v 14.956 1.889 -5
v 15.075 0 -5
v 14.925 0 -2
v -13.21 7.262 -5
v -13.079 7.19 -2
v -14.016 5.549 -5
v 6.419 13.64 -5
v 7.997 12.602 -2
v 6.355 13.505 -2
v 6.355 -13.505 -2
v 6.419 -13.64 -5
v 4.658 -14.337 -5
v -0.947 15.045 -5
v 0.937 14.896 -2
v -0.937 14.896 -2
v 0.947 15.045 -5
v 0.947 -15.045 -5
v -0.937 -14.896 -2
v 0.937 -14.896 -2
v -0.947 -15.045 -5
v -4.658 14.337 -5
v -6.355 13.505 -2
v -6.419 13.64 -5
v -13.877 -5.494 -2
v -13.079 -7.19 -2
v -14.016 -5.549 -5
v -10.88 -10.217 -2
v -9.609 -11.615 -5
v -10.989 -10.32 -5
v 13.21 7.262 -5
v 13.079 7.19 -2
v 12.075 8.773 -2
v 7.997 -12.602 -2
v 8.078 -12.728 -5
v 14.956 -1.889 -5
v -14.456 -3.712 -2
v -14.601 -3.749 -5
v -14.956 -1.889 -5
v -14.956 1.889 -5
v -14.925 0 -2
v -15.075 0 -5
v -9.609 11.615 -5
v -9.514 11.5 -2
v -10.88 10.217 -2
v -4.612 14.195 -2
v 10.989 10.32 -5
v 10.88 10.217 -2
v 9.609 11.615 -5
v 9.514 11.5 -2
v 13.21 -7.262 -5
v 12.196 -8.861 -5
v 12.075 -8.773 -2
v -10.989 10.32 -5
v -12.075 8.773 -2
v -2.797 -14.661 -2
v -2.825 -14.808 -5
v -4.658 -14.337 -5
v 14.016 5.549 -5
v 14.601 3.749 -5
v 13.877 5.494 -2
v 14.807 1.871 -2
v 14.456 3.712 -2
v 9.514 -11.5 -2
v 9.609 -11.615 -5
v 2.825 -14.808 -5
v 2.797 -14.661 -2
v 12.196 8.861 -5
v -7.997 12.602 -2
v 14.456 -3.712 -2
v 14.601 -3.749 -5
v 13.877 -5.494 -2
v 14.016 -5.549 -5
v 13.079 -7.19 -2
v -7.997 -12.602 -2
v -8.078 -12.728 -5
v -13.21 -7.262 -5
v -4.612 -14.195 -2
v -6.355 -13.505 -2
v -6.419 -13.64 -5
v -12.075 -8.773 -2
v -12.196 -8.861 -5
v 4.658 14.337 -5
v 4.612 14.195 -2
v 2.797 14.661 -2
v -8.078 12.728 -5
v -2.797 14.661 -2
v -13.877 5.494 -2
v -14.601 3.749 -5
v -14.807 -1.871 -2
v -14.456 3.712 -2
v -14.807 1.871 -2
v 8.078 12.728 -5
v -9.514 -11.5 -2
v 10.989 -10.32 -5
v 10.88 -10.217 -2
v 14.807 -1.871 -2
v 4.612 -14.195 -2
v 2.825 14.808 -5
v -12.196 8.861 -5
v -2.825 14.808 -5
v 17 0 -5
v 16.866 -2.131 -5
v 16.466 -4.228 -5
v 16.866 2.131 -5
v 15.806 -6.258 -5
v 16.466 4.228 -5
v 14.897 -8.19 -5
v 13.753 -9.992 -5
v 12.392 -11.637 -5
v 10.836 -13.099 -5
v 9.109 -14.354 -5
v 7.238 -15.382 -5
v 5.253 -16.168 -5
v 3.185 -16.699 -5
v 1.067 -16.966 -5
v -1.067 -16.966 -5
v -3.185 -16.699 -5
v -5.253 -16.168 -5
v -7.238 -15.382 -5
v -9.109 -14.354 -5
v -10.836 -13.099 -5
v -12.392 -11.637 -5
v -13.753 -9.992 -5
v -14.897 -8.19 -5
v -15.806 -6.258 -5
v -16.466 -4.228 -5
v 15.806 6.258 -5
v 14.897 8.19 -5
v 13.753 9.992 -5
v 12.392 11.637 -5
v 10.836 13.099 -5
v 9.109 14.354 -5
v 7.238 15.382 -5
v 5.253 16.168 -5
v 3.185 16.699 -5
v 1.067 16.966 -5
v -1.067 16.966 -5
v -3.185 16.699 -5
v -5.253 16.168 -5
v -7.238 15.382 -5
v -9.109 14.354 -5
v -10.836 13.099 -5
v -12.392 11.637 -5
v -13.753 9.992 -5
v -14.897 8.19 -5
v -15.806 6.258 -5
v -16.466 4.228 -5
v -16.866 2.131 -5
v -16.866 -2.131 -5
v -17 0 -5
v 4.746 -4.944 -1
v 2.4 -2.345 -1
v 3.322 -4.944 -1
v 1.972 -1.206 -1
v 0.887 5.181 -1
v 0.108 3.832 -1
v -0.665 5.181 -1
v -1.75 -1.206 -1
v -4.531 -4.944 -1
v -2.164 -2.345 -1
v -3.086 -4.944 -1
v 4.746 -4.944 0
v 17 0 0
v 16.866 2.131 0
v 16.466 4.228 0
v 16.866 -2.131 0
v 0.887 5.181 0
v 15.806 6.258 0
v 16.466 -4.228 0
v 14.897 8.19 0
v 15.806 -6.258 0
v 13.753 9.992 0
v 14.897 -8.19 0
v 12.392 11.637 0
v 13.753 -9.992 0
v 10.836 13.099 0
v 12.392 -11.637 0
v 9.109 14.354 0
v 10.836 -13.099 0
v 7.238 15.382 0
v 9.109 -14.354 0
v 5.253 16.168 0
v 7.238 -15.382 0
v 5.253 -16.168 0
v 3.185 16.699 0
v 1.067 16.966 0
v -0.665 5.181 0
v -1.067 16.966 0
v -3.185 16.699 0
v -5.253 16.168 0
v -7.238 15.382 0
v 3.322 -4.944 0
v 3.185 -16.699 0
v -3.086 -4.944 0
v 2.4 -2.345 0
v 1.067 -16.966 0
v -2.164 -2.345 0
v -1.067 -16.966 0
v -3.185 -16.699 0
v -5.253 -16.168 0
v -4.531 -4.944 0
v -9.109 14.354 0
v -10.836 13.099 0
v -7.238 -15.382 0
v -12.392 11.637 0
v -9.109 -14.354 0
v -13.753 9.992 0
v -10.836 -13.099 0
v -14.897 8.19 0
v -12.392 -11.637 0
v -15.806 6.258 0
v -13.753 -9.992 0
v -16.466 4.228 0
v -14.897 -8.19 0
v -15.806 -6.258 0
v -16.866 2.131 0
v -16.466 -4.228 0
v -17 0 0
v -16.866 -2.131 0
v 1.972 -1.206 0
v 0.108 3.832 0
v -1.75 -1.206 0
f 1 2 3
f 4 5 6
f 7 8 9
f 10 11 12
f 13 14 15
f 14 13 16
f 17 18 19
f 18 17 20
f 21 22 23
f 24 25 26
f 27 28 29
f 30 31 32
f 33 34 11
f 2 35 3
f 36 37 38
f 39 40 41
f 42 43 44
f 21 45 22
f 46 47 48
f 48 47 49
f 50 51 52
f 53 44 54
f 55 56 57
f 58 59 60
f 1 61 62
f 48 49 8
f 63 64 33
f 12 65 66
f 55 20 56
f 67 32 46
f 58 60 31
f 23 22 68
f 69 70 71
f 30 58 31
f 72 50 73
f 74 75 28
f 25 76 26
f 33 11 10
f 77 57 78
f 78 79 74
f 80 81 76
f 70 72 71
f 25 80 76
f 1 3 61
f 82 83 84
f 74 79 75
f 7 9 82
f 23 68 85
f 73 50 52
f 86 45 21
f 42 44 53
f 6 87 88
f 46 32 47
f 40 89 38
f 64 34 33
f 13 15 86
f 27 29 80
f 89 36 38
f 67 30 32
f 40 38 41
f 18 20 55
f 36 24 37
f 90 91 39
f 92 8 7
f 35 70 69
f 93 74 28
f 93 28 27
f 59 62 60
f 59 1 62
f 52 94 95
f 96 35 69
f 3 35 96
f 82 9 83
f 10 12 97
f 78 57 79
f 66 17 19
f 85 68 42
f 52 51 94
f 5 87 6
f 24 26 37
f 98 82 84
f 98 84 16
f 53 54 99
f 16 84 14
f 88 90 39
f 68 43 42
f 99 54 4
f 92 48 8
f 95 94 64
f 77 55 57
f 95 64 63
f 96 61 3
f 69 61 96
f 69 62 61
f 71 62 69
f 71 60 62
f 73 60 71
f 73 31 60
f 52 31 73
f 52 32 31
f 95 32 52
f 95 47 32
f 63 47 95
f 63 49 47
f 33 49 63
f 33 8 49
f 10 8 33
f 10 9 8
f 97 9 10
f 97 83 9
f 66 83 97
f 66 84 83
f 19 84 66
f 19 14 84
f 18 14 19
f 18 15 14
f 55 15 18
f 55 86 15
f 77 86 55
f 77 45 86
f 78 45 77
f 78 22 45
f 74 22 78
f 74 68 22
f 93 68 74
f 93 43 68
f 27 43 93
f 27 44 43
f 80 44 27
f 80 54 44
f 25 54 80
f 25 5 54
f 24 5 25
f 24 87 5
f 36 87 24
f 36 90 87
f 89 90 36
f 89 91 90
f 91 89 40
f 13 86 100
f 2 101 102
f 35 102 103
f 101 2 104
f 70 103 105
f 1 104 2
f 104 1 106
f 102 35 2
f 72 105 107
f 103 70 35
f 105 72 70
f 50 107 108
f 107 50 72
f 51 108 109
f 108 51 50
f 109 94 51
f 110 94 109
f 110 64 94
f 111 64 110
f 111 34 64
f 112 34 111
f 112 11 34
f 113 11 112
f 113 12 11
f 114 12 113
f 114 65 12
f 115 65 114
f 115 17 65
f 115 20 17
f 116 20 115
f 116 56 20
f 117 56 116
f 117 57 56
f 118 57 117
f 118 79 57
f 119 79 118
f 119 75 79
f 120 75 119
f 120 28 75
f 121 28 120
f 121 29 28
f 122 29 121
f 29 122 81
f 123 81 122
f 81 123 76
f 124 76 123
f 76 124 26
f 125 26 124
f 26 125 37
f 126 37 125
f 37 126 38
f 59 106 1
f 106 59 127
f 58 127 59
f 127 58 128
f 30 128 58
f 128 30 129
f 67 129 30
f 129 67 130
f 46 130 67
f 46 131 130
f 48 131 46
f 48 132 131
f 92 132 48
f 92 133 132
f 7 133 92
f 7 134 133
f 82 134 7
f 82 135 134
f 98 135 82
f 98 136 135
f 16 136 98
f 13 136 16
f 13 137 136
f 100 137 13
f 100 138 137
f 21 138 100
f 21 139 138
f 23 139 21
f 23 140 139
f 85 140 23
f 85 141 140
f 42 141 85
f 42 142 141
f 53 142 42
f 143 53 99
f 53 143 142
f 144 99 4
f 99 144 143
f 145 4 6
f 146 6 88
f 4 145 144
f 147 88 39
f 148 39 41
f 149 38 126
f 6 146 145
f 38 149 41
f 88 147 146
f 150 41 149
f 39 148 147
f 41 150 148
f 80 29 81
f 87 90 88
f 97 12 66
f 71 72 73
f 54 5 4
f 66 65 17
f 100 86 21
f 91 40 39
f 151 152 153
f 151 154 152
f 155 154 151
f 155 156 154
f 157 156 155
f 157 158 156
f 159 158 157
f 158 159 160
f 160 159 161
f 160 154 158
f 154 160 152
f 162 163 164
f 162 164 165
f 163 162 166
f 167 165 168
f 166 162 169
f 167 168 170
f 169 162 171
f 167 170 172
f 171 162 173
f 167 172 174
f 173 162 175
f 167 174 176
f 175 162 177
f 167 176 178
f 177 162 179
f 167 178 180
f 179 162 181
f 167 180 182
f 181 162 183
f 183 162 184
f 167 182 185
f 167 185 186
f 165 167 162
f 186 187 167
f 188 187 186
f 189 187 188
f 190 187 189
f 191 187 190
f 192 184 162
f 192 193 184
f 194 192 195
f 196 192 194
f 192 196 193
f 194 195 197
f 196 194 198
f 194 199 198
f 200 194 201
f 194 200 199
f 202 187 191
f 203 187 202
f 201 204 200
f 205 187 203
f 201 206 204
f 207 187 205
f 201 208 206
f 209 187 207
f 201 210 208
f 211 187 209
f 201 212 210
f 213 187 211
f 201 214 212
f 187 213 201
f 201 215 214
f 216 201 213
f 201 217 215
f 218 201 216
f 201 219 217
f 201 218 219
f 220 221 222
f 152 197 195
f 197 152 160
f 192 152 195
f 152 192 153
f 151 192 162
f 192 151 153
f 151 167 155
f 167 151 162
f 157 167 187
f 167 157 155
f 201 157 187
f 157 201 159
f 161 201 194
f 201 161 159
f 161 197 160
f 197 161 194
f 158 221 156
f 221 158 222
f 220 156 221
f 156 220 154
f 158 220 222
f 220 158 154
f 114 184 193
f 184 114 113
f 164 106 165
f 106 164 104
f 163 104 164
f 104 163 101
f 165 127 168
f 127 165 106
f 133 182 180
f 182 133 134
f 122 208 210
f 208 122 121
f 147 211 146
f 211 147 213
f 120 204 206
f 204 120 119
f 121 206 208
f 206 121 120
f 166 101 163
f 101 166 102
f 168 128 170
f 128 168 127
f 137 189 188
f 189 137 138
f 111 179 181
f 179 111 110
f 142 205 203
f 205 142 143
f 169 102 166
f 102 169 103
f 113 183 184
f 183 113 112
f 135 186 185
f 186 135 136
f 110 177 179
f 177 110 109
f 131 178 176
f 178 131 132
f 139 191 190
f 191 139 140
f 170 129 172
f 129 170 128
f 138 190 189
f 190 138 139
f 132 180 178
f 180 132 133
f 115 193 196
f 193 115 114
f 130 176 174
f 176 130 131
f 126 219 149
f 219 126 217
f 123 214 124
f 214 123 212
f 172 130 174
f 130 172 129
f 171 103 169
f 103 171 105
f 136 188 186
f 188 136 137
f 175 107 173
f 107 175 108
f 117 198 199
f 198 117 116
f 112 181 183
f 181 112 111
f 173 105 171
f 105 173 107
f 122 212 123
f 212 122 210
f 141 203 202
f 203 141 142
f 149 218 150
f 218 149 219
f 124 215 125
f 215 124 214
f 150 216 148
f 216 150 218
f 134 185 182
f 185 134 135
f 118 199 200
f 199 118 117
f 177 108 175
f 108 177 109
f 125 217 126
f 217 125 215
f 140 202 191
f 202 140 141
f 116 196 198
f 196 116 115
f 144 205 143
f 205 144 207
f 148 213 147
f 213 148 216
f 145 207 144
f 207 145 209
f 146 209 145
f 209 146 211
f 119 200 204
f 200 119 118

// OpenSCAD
$fn = 50;

difference() {
	union() {
		translate(v = [0, 0, -5.0]) {
			cylinder(h = 5, r = 17.0);
		}
	}
	union() {
		#translate(v = [0, 0, -5.0]) {
			cylinder(h = 3, r1 = 15.075, r2 = 14.925);
		}
		translate(v = [0, 0, -1]) {
			linear_extrude(height = 1) {
				text(font = "Impact", halign = "center", size = 10, text = "A", valign = "center");
			}
		}
	}
}
